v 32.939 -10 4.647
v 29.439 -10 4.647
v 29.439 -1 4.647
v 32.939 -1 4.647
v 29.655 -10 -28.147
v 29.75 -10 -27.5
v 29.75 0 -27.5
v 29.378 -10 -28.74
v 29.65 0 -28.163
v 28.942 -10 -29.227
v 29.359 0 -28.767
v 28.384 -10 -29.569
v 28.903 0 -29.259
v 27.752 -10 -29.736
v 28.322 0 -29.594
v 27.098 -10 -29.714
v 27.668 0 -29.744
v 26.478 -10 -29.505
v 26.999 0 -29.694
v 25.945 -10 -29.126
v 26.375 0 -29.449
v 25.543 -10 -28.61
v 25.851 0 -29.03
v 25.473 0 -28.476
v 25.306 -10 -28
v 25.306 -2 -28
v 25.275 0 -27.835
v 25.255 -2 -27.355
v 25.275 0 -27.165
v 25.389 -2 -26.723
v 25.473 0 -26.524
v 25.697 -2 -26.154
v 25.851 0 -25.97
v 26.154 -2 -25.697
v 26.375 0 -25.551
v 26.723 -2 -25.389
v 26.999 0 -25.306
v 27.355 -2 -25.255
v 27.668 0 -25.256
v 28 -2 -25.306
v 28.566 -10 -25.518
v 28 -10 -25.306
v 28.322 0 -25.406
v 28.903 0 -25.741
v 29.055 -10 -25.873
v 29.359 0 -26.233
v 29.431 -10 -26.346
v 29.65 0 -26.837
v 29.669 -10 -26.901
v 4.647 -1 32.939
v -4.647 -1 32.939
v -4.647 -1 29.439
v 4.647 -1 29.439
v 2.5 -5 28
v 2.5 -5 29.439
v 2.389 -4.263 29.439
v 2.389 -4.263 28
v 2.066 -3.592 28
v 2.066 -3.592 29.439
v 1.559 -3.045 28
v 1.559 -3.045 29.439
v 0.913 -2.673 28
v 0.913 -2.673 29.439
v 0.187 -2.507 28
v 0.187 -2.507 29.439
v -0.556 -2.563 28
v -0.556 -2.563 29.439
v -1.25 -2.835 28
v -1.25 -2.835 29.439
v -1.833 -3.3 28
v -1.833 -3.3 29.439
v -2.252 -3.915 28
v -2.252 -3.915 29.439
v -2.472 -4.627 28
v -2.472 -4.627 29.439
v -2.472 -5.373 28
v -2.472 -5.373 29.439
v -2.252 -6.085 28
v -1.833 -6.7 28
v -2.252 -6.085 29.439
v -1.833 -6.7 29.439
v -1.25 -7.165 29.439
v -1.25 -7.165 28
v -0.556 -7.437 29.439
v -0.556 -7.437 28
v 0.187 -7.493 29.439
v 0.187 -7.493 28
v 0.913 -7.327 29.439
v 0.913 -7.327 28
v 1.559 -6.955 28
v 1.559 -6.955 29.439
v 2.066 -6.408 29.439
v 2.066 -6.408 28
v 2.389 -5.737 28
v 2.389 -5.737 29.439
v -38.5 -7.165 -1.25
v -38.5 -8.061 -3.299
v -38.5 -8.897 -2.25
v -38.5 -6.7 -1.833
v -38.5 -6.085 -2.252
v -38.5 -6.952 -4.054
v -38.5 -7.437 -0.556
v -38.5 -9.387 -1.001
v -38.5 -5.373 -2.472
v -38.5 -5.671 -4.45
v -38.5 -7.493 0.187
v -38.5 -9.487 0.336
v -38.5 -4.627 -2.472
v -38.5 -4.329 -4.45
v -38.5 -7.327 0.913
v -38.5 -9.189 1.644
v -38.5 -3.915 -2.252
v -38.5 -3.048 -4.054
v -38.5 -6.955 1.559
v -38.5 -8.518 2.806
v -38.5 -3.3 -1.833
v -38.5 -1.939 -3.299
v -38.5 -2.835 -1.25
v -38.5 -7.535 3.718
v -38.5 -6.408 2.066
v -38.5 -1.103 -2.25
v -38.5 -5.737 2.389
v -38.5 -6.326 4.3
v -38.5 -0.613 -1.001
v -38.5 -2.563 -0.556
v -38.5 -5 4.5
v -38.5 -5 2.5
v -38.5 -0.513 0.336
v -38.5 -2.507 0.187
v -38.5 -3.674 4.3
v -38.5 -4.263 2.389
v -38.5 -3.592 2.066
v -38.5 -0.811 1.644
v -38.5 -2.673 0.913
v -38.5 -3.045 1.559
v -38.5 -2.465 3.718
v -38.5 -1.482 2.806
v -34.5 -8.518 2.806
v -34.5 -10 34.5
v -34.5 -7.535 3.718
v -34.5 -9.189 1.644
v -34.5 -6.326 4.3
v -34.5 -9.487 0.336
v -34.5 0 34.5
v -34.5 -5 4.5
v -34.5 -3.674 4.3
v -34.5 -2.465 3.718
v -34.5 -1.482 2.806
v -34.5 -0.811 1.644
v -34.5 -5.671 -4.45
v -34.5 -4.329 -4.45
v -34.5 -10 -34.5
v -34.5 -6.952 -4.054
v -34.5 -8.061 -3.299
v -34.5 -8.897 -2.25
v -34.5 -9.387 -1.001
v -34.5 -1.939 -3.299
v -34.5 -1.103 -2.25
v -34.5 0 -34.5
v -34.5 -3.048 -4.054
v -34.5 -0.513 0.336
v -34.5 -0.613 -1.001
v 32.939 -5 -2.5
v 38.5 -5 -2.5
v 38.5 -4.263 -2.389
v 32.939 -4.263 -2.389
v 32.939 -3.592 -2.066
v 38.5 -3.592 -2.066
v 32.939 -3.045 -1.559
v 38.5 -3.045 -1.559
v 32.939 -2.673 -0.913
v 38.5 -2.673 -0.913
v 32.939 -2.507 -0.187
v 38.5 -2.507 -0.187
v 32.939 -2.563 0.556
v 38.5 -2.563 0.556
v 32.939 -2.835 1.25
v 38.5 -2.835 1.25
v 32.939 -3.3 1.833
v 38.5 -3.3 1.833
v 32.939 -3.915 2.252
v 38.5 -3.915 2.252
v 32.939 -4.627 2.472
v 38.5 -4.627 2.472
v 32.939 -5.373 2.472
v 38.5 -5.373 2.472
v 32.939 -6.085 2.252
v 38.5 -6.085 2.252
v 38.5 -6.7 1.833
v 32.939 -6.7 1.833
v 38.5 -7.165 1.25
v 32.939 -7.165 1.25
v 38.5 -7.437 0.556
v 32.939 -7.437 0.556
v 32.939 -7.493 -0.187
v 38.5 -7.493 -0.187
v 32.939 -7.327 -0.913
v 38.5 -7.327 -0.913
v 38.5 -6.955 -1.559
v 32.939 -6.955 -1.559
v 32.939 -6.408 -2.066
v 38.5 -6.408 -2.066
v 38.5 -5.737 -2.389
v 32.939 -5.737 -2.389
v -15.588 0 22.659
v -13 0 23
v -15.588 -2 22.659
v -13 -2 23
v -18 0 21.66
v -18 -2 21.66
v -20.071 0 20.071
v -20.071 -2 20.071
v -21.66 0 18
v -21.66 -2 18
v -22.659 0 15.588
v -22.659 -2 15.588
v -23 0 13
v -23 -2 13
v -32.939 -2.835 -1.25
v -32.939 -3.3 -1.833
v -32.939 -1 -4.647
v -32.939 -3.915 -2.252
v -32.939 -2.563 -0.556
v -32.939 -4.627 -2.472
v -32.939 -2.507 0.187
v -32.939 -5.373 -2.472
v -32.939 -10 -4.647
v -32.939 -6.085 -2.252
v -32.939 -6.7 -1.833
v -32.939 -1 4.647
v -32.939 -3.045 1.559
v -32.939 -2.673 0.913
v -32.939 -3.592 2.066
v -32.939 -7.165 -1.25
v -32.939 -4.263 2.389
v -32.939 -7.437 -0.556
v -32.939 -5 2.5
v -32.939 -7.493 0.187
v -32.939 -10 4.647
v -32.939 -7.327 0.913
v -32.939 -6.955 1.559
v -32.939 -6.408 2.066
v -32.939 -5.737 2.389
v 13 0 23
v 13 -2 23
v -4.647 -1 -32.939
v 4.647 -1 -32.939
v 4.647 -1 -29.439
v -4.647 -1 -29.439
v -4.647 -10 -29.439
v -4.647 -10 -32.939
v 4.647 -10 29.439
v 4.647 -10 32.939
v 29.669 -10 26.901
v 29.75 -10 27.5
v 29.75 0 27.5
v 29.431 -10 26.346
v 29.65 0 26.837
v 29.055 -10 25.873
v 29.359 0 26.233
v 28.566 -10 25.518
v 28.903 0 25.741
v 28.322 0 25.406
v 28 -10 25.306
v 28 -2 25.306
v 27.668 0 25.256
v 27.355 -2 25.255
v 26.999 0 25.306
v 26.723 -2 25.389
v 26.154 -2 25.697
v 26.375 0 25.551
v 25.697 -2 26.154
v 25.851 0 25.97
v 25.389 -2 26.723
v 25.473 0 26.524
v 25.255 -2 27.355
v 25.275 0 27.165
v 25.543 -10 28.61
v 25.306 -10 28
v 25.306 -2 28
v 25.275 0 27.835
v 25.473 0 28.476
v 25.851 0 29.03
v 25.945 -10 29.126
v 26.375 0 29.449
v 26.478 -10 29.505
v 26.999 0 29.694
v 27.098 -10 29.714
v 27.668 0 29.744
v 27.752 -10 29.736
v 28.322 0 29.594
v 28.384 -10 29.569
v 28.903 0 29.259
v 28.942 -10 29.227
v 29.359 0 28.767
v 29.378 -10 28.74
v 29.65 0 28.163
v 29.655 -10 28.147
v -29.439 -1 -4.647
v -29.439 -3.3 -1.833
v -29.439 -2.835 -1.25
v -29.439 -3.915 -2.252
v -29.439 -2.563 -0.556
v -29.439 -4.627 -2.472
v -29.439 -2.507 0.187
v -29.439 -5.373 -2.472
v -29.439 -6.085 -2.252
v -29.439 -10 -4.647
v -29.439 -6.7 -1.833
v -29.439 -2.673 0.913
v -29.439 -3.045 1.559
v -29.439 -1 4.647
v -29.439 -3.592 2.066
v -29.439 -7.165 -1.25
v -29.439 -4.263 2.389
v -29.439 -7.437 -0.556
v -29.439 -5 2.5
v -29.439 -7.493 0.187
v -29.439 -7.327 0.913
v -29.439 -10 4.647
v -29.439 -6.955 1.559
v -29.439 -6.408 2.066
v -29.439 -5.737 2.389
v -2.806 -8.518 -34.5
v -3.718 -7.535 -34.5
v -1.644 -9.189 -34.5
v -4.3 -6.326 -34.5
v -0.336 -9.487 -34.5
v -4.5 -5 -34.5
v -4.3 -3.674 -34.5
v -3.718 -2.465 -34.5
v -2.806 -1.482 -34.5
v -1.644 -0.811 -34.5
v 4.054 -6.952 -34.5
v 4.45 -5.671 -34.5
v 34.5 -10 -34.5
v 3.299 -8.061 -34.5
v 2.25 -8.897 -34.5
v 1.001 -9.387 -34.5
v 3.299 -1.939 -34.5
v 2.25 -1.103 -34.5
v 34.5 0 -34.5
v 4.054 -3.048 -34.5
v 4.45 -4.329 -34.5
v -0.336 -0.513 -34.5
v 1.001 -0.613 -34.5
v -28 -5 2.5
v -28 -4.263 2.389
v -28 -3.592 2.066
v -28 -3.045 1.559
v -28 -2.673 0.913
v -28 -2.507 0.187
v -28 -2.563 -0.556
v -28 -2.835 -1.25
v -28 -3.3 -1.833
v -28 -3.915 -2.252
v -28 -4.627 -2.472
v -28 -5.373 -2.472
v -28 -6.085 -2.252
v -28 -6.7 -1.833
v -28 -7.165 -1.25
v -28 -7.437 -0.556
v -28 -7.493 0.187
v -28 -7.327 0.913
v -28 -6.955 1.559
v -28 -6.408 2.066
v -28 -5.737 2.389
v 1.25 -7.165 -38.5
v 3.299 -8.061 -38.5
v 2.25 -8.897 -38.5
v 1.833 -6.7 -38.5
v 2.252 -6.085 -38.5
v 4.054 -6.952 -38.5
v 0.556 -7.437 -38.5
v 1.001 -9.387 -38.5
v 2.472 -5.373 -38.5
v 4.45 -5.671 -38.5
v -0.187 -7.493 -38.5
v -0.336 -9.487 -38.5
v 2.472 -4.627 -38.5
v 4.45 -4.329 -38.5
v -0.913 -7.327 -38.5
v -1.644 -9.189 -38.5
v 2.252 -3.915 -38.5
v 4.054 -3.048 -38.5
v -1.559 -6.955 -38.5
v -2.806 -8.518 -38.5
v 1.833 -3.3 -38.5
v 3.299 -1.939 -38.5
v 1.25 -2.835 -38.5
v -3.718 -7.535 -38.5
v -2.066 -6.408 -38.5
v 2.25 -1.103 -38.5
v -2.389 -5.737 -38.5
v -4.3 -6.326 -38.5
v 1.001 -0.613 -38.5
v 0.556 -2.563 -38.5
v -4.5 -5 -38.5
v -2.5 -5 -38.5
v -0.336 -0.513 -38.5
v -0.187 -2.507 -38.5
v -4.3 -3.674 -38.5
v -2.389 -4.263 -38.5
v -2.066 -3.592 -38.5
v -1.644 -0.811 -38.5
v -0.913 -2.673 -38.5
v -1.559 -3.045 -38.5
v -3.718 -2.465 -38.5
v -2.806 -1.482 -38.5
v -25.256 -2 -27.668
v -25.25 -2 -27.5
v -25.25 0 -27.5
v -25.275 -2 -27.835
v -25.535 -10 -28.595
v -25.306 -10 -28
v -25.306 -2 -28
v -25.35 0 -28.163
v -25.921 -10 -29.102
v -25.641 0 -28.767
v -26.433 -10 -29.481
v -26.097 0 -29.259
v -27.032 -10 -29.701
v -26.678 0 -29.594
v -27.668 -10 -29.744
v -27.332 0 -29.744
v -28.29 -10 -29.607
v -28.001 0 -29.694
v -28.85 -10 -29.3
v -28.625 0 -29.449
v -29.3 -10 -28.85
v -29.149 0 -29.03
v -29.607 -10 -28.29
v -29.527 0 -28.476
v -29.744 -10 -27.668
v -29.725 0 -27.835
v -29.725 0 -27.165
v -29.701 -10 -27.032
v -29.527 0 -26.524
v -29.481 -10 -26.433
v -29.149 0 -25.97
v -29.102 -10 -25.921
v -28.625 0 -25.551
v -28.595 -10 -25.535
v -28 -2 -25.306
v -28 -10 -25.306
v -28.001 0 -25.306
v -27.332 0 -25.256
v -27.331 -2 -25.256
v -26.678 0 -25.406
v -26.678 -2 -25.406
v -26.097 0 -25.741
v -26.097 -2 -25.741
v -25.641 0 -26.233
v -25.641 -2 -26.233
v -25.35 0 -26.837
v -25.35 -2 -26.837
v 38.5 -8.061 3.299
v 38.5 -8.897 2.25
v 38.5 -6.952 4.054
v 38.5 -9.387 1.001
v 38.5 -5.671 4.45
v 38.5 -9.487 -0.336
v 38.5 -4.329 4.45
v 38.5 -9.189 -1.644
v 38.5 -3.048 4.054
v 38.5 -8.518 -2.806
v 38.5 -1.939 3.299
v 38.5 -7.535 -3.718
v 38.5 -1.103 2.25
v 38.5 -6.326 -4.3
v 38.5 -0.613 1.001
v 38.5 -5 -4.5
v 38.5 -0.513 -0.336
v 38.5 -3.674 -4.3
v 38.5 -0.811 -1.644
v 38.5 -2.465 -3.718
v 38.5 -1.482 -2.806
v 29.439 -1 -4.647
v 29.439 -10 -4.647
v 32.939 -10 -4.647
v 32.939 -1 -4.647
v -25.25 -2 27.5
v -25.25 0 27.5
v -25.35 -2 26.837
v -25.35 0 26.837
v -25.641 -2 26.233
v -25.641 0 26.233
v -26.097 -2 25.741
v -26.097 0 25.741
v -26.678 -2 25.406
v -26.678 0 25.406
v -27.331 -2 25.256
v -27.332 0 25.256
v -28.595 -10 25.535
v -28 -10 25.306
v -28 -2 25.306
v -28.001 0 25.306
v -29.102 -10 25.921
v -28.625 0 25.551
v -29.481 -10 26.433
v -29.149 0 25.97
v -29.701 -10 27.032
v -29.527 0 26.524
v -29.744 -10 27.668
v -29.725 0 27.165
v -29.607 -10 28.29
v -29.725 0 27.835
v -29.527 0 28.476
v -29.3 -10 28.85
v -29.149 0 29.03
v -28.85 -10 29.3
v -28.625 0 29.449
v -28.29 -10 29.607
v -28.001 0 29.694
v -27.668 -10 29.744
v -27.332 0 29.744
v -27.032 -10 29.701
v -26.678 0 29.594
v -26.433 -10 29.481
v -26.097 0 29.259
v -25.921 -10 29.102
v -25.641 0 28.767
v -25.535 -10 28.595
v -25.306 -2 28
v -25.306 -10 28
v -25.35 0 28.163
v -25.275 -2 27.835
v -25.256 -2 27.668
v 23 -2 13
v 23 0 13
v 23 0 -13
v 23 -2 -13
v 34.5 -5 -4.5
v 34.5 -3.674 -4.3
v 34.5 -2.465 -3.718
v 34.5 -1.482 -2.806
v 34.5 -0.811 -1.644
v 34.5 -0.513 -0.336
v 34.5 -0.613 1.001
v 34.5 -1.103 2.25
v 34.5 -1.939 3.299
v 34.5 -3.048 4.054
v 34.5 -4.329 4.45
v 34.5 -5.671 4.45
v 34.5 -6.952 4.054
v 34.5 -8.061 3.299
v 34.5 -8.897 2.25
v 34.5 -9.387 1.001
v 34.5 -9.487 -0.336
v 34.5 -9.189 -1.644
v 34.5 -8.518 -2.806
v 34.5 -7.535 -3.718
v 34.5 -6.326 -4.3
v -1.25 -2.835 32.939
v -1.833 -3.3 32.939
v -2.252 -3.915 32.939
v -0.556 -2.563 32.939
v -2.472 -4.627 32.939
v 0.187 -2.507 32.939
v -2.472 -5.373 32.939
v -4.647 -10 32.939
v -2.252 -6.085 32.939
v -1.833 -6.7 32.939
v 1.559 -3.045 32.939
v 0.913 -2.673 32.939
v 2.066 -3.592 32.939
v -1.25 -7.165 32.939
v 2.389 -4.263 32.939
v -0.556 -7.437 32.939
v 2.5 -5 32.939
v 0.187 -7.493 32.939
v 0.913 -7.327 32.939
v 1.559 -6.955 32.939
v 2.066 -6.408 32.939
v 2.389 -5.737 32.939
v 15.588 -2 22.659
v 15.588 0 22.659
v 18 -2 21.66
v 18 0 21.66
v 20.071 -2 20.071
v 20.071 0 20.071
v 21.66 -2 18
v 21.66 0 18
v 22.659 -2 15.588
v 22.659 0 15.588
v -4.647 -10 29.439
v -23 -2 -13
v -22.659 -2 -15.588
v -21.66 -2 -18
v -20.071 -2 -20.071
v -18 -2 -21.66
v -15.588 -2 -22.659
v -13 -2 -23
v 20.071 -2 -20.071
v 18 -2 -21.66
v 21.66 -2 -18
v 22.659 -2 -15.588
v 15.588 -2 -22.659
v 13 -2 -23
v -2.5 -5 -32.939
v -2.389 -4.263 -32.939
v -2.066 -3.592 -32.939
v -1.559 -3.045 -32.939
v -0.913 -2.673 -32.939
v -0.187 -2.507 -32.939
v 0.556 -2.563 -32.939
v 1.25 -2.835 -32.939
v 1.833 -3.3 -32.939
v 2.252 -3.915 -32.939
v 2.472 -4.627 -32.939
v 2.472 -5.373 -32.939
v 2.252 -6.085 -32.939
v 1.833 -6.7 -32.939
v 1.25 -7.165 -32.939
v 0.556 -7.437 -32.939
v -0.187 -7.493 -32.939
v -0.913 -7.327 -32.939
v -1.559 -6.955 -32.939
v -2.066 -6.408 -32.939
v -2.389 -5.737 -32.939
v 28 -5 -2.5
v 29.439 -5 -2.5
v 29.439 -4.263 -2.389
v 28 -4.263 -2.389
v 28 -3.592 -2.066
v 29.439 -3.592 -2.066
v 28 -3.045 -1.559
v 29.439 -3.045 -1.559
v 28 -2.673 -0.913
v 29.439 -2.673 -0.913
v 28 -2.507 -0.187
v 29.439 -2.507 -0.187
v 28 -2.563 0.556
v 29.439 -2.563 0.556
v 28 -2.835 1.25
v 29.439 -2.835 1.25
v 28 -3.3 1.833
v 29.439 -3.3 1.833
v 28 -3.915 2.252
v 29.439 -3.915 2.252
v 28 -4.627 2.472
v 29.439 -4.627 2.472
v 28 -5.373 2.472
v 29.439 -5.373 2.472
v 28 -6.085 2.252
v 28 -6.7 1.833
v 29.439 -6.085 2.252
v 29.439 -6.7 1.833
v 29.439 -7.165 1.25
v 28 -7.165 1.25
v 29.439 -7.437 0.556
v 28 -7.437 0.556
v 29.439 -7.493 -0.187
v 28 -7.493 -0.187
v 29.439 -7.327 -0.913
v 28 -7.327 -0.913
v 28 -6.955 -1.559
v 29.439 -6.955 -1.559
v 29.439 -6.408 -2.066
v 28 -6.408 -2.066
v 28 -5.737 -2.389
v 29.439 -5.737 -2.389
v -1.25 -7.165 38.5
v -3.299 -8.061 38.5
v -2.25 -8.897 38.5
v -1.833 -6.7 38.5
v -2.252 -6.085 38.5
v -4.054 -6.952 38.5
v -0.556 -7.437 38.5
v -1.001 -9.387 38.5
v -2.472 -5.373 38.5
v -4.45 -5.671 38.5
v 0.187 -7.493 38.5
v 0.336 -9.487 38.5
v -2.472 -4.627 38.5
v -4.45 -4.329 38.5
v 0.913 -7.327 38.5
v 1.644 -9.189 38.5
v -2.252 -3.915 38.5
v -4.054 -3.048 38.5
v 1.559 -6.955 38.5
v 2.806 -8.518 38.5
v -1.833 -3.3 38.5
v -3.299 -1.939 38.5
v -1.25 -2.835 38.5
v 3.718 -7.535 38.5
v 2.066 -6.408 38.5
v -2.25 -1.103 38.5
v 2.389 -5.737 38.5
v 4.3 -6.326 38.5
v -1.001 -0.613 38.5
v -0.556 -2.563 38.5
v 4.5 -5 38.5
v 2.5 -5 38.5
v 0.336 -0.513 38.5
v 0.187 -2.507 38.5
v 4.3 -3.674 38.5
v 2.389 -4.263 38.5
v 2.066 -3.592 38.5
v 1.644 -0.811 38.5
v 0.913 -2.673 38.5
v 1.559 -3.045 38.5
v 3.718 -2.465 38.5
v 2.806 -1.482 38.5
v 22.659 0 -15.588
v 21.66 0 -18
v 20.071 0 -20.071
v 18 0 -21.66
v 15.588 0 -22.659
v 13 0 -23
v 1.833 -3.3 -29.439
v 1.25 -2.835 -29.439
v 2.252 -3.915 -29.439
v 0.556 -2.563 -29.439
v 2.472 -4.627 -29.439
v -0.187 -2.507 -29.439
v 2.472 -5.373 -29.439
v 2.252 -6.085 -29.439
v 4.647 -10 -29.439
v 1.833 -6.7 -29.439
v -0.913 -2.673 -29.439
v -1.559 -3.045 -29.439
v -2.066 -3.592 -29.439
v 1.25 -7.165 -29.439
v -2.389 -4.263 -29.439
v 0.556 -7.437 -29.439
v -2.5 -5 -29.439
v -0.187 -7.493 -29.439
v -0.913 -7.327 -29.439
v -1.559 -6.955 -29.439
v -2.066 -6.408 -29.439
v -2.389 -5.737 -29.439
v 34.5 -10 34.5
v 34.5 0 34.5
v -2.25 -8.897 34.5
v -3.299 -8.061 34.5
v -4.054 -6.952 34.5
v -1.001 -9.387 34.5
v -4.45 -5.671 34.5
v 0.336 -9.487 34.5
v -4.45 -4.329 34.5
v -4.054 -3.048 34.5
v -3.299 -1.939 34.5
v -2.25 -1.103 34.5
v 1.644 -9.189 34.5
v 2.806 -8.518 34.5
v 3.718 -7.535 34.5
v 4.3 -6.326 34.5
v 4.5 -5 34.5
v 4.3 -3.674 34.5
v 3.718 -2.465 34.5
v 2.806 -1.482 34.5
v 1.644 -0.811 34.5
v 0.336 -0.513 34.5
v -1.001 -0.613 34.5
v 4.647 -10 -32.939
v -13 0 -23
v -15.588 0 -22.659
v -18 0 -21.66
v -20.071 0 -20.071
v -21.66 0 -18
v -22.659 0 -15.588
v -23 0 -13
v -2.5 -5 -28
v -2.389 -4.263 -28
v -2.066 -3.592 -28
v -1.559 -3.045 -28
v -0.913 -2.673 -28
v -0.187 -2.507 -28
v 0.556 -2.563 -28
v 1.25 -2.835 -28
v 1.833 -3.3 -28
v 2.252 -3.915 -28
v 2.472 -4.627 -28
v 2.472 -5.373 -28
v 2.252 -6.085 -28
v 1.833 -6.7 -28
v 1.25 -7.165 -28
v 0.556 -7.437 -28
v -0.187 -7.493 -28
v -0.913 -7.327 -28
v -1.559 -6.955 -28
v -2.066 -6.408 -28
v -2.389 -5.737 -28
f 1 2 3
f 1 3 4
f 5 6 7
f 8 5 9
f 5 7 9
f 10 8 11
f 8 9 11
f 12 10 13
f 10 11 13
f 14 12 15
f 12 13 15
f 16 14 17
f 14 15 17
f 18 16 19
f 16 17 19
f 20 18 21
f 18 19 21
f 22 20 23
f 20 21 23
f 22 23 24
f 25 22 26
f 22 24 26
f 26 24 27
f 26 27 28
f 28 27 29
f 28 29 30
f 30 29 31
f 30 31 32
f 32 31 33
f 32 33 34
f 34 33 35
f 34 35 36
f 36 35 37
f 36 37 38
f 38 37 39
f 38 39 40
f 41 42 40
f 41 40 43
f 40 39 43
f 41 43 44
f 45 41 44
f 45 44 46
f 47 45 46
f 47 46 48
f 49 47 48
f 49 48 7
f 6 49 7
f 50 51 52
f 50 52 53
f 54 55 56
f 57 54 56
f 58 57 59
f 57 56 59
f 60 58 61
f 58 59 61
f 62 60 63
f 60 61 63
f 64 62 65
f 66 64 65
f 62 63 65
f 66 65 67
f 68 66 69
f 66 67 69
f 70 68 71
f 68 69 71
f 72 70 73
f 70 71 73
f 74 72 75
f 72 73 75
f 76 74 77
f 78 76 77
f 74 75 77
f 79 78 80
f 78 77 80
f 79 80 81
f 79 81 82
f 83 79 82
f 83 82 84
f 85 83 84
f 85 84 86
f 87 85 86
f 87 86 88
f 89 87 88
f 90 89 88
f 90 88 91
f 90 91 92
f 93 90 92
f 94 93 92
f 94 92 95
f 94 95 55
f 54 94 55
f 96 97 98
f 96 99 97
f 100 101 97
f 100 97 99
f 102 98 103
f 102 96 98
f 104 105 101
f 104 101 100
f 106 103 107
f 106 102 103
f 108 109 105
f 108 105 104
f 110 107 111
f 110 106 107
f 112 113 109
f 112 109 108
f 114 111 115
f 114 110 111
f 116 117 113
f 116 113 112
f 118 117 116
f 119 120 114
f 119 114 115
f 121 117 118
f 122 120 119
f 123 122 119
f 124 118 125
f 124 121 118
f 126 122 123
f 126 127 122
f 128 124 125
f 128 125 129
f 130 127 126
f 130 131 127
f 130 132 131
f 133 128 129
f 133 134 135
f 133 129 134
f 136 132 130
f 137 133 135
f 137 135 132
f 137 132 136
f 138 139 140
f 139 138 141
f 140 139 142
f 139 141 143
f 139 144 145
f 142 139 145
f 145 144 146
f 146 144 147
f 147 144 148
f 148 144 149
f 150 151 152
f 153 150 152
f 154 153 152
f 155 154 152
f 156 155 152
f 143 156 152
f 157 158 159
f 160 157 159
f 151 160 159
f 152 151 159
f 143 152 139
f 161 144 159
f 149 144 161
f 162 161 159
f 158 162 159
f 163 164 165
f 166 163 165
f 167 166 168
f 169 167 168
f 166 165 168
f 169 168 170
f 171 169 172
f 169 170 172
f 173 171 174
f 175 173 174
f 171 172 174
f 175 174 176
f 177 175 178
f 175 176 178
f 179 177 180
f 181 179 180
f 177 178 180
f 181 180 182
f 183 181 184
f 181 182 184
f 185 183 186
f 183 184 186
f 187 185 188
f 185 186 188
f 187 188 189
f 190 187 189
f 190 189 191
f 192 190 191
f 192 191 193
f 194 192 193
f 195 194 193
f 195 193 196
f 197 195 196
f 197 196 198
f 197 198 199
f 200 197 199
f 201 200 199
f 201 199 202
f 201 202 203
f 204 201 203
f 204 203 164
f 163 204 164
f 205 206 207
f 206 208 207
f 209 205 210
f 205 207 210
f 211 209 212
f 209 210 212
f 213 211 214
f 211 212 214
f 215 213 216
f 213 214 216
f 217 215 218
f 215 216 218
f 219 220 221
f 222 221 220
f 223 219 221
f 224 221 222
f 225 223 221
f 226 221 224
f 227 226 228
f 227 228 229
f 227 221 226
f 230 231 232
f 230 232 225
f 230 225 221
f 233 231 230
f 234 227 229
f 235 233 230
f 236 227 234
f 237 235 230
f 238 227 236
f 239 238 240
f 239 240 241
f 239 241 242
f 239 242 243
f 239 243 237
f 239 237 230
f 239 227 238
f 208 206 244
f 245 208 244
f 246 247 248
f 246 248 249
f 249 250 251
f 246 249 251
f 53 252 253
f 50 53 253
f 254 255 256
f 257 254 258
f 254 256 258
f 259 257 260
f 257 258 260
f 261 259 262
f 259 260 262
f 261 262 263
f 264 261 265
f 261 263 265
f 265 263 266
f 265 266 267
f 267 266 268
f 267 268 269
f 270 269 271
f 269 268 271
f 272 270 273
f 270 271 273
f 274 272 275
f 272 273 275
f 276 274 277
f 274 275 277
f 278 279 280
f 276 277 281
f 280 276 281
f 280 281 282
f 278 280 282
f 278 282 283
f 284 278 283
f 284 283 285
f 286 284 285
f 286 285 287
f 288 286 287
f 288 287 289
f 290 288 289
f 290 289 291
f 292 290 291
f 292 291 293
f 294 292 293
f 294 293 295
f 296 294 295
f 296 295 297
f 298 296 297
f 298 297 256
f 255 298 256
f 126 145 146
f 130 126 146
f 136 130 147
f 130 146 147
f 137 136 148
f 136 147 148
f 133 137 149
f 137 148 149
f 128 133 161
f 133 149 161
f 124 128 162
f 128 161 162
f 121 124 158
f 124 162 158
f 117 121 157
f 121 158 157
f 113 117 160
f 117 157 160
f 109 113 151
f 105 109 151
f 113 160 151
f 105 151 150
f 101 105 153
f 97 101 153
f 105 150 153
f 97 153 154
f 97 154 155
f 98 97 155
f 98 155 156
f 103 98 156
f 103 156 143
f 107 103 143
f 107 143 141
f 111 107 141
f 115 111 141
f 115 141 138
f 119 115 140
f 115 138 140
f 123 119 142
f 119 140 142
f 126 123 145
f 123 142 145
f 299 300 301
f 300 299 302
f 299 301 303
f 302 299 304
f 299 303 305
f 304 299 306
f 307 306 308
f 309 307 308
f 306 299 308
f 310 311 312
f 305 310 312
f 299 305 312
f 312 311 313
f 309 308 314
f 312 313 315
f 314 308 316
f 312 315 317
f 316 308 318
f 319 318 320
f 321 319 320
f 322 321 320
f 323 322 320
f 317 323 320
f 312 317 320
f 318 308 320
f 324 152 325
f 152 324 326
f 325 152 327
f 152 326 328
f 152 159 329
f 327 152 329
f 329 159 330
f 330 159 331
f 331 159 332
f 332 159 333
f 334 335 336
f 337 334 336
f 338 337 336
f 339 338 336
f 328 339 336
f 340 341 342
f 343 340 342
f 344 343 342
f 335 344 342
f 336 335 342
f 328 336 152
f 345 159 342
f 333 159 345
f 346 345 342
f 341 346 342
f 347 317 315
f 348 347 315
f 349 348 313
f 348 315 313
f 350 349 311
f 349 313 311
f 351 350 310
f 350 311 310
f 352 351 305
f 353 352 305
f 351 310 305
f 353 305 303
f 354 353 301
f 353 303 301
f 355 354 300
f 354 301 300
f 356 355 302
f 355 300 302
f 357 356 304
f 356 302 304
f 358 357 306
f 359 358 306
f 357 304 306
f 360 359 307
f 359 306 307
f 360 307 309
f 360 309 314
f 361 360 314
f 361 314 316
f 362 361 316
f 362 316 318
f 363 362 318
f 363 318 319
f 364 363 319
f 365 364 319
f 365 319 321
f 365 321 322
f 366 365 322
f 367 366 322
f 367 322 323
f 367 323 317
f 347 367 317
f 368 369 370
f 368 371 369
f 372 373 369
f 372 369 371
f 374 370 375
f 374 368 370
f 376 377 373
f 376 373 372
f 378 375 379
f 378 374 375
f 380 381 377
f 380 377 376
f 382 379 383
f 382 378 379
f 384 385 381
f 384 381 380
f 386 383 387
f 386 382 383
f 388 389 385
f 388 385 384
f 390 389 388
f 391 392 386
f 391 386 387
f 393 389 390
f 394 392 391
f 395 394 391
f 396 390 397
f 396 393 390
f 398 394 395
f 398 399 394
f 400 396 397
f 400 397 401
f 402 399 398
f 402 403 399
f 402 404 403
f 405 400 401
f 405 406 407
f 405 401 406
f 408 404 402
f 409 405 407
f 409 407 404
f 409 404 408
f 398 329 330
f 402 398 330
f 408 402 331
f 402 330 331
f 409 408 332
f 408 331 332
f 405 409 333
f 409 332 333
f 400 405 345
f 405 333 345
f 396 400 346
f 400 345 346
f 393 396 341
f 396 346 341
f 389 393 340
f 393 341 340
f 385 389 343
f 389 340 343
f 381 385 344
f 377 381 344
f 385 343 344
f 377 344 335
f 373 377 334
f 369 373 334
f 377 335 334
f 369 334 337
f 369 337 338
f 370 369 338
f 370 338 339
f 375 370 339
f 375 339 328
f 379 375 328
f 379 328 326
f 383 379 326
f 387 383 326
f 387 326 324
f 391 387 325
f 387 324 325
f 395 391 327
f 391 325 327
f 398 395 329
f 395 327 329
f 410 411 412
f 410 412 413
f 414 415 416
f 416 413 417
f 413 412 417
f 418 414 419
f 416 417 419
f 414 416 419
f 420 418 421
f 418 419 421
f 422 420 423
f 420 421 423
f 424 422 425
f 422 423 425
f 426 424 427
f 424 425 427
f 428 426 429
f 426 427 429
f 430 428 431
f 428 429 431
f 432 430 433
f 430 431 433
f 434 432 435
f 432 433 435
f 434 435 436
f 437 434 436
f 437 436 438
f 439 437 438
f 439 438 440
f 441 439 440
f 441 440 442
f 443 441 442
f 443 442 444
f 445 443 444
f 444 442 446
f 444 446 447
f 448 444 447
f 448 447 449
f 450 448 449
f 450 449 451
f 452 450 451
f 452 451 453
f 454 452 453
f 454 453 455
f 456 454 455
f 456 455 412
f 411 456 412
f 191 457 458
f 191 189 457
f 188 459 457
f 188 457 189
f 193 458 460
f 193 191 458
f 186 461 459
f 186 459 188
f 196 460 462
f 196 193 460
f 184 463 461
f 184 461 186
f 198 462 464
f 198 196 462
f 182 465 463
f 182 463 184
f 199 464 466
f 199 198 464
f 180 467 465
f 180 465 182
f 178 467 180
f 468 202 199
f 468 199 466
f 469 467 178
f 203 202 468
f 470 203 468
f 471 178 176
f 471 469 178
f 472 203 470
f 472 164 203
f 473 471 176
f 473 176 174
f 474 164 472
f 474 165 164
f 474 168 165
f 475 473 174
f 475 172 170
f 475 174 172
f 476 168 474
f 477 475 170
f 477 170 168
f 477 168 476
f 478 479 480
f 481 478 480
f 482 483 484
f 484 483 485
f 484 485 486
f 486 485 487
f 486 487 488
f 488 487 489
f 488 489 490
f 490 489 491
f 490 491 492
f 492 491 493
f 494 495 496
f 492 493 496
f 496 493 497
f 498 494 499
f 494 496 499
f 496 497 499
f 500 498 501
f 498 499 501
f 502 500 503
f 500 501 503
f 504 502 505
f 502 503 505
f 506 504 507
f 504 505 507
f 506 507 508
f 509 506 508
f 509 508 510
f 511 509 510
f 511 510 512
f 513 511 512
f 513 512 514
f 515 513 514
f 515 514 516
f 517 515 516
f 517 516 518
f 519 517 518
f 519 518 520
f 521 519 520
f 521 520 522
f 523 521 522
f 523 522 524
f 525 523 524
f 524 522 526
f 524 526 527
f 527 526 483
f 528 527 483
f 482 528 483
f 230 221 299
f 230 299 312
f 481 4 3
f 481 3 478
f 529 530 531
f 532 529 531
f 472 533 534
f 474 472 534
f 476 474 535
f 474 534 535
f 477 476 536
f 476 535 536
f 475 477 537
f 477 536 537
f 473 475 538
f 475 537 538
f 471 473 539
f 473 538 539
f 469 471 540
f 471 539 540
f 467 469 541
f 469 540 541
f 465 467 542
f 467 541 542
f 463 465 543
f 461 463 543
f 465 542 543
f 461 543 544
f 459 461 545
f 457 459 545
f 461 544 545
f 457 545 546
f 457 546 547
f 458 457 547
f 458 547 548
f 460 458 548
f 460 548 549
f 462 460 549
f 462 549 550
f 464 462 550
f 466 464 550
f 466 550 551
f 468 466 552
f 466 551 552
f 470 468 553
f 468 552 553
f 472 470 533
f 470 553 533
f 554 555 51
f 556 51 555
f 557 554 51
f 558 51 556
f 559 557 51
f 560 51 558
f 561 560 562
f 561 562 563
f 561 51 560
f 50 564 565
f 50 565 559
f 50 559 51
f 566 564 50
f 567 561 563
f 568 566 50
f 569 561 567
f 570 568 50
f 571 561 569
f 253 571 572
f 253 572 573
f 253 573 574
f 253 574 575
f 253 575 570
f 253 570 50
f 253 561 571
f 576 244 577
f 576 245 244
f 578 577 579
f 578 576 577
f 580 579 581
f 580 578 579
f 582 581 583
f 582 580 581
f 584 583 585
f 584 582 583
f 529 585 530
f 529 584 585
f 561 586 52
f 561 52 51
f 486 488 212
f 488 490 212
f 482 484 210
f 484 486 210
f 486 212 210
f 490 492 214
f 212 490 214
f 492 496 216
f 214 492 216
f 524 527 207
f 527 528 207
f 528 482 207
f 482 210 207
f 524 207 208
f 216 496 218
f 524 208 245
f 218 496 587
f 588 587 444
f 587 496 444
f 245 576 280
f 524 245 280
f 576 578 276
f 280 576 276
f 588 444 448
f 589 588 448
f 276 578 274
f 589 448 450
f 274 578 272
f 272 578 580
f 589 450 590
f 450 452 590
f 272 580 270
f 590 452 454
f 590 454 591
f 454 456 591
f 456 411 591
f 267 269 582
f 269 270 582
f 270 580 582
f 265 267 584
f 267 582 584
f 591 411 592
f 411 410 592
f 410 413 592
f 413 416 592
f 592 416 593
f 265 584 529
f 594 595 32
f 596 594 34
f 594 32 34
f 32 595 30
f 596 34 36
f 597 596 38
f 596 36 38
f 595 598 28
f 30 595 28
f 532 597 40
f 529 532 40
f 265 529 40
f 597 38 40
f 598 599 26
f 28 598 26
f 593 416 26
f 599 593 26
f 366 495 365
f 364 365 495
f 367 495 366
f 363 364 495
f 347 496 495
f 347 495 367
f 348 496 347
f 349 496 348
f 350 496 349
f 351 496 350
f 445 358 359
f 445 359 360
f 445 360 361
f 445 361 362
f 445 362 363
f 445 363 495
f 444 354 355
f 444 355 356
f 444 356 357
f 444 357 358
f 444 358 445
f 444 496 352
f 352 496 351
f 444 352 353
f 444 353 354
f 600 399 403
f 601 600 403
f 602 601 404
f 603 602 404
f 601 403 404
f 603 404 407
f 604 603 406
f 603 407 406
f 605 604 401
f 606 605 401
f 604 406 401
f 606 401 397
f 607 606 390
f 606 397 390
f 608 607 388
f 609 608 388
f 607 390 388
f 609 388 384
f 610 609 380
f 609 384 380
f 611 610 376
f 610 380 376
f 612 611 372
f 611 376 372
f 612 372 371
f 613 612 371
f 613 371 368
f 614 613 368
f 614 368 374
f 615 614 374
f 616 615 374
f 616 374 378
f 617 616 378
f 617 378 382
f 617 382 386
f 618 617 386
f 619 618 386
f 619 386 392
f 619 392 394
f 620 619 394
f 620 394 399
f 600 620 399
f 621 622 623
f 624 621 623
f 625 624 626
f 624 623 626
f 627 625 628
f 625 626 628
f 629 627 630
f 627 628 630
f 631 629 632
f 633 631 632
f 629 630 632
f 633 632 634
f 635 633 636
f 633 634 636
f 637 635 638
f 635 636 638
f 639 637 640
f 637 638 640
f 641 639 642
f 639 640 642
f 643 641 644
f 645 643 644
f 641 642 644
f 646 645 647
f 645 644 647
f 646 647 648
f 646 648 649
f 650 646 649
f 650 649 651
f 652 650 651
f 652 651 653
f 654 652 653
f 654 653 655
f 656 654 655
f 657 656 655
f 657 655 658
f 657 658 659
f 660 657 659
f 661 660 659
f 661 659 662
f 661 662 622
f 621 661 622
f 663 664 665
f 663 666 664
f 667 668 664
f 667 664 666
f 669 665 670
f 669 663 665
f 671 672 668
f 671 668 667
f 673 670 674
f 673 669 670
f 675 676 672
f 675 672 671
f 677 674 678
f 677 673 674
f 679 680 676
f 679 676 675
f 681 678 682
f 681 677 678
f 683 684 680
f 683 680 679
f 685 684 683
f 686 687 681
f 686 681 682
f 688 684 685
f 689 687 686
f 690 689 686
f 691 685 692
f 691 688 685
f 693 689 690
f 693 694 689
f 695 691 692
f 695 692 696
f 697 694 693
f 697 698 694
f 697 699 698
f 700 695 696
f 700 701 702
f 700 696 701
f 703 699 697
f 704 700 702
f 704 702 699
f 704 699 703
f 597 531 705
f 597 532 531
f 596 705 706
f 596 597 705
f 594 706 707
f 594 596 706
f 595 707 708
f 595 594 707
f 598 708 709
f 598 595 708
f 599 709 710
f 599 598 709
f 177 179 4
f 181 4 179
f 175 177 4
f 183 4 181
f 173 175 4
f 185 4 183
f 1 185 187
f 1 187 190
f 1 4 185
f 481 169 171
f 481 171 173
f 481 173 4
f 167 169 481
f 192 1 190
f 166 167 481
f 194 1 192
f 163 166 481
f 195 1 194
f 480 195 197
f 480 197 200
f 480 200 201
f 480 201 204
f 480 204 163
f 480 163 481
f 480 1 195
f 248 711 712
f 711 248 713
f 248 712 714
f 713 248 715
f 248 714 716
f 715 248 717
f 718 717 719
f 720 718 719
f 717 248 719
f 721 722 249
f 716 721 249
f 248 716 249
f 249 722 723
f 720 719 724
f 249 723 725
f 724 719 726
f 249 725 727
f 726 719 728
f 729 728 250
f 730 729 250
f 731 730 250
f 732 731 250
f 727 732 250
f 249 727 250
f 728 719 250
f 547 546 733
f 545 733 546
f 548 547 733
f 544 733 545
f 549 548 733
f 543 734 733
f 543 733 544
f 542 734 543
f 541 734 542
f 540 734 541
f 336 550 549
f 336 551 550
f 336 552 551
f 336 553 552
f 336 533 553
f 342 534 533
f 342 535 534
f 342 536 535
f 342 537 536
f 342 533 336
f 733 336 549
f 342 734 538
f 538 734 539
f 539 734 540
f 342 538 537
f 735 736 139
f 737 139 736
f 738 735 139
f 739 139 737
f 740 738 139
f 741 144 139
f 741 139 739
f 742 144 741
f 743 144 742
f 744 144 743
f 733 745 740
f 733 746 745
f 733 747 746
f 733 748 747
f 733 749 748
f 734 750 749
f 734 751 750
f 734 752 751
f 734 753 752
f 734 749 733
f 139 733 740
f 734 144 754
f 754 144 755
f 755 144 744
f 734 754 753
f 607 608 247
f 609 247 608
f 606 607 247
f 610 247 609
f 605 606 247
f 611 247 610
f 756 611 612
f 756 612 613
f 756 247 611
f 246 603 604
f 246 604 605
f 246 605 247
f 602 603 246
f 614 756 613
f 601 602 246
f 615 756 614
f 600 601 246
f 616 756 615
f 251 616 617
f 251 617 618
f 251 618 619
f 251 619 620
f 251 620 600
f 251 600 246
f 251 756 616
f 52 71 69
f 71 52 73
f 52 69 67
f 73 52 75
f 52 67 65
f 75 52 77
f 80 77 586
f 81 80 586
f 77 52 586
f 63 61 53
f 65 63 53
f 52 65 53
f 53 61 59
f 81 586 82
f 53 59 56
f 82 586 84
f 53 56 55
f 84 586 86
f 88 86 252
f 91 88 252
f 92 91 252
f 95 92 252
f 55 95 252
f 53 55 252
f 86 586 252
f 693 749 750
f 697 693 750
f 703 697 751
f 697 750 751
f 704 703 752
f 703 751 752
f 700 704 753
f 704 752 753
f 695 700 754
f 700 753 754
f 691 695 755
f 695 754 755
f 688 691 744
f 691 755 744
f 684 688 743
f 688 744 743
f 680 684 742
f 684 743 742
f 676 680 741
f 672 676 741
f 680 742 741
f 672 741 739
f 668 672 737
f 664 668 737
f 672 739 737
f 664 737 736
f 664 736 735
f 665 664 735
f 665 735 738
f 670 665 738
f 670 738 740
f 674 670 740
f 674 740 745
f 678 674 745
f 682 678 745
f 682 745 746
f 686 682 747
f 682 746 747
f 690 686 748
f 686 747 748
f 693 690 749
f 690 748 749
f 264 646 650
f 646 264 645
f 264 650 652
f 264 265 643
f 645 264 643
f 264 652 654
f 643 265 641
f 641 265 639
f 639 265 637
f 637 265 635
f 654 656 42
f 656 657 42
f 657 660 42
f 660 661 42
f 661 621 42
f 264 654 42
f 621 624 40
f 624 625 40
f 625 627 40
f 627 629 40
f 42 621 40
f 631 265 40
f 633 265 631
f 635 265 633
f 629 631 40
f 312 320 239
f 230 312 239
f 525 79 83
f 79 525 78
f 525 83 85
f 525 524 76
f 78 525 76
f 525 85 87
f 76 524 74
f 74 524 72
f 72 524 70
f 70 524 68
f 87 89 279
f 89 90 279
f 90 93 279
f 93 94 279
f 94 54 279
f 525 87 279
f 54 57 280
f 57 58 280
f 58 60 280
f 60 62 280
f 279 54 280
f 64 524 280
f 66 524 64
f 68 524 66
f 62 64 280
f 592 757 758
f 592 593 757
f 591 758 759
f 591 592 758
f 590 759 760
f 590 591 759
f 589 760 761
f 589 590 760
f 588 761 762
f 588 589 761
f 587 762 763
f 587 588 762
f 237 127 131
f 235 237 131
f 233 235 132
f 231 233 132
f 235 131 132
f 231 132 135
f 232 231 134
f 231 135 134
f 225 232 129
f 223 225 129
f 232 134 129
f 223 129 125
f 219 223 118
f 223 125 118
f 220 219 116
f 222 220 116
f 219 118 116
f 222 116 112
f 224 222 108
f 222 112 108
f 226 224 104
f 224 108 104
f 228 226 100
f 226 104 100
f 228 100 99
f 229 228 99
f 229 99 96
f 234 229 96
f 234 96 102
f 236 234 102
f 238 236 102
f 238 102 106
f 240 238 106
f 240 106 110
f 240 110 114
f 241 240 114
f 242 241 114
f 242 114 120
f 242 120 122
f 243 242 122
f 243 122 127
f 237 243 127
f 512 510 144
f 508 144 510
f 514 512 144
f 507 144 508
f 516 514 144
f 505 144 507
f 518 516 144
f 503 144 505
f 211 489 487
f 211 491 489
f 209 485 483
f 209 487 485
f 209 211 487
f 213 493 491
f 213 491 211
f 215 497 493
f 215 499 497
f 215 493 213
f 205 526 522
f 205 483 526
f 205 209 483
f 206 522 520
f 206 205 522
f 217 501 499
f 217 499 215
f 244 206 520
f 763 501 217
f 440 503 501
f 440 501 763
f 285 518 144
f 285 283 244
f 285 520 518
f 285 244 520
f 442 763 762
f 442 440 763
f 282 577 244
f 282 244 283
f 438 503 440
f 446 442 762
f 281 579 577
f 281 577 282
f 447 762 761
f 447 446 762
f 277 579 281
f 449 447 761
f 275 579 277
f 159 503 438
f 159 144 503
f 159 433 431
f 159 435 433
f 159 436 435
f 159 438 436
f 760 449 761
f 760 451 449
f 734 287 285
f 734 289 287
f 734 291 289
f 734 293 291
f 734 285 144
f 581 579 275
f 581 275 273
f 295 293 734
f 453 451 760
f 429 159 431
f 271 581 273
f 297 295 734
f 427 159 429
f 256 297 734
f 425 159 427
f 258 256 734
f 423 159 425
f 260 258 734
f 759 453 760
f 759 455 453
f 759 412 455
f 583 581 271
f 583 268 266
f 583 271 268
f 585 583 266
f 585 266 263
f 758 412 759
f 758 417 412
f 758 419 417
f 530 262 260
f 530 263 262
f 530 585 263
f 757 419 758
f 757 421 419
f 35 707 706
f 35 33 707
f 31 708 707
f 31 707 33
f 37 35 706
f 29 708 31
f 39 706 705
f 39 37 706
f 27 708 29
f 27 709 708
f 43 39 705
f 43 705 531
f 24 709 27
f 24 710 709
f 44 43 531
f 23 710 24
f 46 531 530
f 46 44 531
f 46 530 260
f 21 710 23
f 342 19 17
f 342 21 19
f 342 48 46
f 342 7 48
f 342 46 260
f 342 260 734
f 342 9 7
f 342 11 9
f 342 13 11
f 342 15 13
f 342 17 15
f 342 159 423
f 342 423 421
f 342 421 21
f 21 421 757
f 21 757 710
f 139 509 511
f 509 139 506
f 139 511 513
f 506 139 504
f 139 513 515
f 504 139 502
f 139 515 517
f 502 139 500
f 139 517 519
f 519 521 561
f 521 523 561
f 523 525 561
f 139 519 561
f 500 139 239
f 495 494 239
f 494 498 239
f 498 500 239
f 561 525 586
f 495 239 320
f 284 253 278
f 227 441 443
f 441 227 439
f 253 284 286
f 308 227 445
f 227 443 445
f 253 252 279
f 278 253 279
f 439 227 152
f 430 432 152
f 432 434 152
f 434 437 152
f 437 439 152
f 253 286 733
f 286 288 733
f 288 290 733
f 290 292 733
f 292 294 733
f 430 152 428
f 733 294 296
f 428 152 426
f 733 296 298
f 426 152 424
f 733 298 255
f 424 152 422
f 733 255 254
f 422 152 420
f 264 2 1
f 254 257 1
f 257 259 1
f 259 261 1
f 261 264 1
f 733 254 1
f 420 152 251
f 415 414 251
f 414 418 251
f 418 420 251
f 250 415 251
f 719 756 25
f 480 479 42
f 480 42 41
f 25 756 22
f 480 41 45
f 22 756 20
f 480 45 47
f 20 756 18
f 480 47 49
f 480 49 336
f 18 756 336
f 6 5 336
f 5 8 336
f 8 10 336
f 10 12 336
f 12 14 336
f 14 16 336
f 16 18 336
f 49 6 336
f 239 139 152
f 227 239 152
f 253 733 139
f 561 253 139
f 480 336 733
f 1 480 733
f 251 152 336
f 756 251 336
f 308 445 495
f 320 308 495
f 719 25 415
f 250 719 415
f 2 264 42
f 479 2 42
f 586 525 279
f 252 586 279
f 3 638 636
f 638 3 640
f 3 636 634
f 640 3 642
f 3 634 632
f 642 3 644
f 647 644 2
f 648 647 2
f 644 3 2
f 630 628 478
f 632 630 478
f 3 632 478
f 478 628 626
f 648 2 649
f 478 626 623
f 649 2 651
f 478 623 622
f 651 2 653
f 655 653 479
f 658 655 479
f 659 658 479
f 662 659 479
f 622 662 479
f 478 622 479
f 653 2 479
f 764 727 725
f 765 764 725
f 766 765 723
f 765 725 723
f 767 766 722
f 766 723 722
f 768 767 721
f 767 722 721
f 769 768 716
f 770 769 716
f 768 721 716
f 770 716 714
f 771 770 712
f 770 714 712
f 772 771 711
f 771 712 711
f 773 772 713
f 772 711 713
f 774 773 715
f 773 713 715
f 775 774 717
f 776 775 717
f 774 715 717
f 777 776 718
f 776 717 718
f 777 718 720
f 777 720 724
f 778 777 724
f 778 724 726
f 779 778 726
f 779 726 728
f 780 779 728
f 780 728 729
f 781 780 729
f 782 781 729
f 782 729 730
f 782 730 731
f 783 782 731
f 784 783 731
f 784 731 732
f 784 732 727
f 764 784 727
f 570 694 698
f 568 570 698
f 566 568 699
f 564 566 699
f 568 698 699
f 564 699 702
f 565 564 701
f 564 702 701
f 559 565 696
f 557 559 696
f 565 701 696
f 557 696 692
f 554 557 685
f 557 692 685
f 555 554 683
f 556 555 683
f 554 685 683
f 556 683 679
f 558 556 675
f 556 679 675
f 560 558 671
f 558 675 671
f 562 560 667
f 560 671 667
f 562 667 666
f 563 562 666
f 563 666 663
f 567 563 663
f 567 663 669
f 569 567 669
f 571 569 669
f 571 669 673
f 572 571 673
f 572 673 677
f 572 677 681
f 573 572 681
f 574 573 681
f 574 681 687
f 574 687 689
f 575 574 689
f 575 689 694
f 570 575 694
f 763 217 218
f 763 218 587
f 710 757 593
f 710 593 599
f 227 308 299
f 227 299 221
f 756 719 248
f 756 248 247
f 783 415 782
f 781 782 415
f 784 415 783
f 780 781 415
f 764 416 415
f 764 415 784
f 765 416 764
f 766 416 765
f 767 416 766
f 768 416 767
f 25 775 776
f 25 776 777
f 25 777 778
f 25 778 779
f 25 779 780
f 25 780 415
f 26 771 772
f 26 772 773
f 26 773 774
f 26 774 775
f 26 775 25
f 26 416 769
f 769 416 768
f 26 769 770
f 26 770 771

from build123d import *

# Parameters (mm, degrees)
SKETCH6_W               = 69
SKETCH6_H               = 69
BOSS_EXTRUDE1_DEPTH     = 10
SKETCH5_R               = 2.25
CUT_EXTRUDE1_DEPTH      = 1
CUT_EXTRUDE1_DEPTH_BACK = 11
CUT_EXTRUDE2_START      = -2
SKETCH7_W               = 56
SKETCH7_H               = 56
CUT_EXTRUDE2_DEPTH      = 10
SKETCH9_W               = 46
SKETCH9_H               = 46
CUT_EXTRUDE3_DEPTH      = 1
CUT_EXTRUDE3_DEPTH_BACK = 11
FILLET1_R               = 10
SKETCH10_R              = 4.5
BOSS_EXTRUDE2_DEPTH     = 4
SKETCH11_R              = 2.5
CUT_EXTRUDE4_DEPTH      = 10.5
SKETCH12_W              = 9.294754328
SKETCH12_H              = 3.5
CUT_EXTRUDE5_DEPTH      = 9
CIRPATTERN1_COUNT       = 4


with BuildPart() as part:
    # Sketch6 → Boss-Extrude1 (new body)
    with BuildSketch(Plane(origin=(0, 0, 0), x_dir=(1, 0, 0), z_dir=(0, 1, 0))):
        Rectangle(SKETCH6_W, SKETCH6_H)
    extrude(amount=-BOSS_EXTRUDE1_DEPTH)

    # Sketch5 → Cut-Extrude1 (cut, two sides)
    with BuildSketch(Plane(origin=(0, 0, 0), x_dir=(1, 0, 0), z_dir=(0, 1, 0))) as cut_extrude1_sk:
        with Locations((27.5, 27.5)):
            Circle(SKETCH5_R)
        with Locations((27.5, -27.5)):
            Circle(SKETCH5_R)
        with Locations((-27.5, -27.5)):
            Circle(SKETCH5_R)
        with Locations((-27.5, 27.5)):
            Circle(SKETCH5_R)
    extrude(amount=CUT_EXTRUDE1_DEPTH, mode=Mode.SUBTRACT)
    extrude(cut_extrude1_sk.sketch, amount=-CUT_EXTRUDE1_DEPTH_BACK, mode=Mode.SUBTRACT)

    # Sketch7 → Cut-Extrude2 (cut)
    with BuildSketch(Plane(origin=(0, 0, 0), x_dir=(1, 0, 0), z_dir=(0, 1, 0)).offset(CUT_EXTRUDE2_START)):
        Rectangle(SKETCH7_W, SKETCH7_H)
    extrude(amount=-CUT_EXTRUDE2_DEPTH, mode=Mode.SUBTRACT)

    # Sketch9 → Cut-Extrude3 (cut, two sides)
    with BuildSketch(Plane(origin=(0, 0, 0), x_dir=(1, 0, 0), z_dir=(0, 1, 0))) as cut_extrude3_sk:
        Rectangle(SKETCH9_W, SKETCH9_H)
    extrude(amount=CUT_EXTRUDE3_DEPTH, mode=Mode.SUBTRACT)
    extrude(cut_extrude3_sk.sketch, amount=-CUT_EXTRUDE3_DEPTH_BACK, mode=Mode.SUBTRACT)

    # Fillet1
    fillet1_edges = [part.edges().sort_by_distance(p)[0] for p in [
        (23, -1, -23),
        (23, -1, 23),
        (-23, -1, 23),
        (-23, -1, -23),
    ]]
    fillet(fillet1_edges, radius=FILLET1_R)

    # Sketch10 → Boss-Extrude2 (add)
    with BuildSketch(Plane(origin=(0, 0, -34.5), x_dir=(-1, 0, 0), z_dir=(0, 0, -1))):
        with Locations((0, -5)):
            Circle(SKETCH10_R)
    boss_extrude2 = extrude(amount=BOSS_EXTRUDE2_DEPTH)

    # Sketch11 → Cut-Extrude4 (cut)
    with BuildSketch(Plane(origin=(0, 0, -38.5), x_dir=(-1, 0, 0), z_dir=(0, 0, -1))):
        with Locations((0, -5)):
            Circle(SKETCH11_R)
    cut_extrude4 = extrude(amount=-CUT_EXTRUDE4_DEPTH, mode=Mode.SUBTRACT)

    # Sketch12 → Cut-Extrude5 (cut)
    with BuildSketch(Plane(origin=(0, -10, 0), x_dir=(-1, 0, 0), z_dir=(0, -1, 0))):
        with Locations((0, 31.188993475)):
            Rectangle(SKETCH12_W, SKETCH12_H)
    cut_extrude5 = extrude(amount=-CUT_EXTRUDE5_DEPTH, mode=Mode.SUBTRACT)

    # CirPattern1: Boss-Extrude2, Cut-Extrude4, Cut-Extrude5 ×4 about axis
    cirpattern1_axis = Axis((0, 0, 0), (0, 1, 0))
    for i in range(1, CIRPATTERN1_COUNT):
        add(boss_extrude2.rotate(cirpattern1_axis, i * 360 / CIRPATTERN1_COUNT))
        add(cut_extrude4.rotate(cirpattern1_axis, i * 360 / CIRPATTERN1_COUNT), mode=Mode.SUBTRACT)
        add(cut_extrude5.rotate(cirpattern1_axis, i * 360 / CIRPATTERN1_COUNT), mode=Mode.SUBTRACT)


solid = part.part
